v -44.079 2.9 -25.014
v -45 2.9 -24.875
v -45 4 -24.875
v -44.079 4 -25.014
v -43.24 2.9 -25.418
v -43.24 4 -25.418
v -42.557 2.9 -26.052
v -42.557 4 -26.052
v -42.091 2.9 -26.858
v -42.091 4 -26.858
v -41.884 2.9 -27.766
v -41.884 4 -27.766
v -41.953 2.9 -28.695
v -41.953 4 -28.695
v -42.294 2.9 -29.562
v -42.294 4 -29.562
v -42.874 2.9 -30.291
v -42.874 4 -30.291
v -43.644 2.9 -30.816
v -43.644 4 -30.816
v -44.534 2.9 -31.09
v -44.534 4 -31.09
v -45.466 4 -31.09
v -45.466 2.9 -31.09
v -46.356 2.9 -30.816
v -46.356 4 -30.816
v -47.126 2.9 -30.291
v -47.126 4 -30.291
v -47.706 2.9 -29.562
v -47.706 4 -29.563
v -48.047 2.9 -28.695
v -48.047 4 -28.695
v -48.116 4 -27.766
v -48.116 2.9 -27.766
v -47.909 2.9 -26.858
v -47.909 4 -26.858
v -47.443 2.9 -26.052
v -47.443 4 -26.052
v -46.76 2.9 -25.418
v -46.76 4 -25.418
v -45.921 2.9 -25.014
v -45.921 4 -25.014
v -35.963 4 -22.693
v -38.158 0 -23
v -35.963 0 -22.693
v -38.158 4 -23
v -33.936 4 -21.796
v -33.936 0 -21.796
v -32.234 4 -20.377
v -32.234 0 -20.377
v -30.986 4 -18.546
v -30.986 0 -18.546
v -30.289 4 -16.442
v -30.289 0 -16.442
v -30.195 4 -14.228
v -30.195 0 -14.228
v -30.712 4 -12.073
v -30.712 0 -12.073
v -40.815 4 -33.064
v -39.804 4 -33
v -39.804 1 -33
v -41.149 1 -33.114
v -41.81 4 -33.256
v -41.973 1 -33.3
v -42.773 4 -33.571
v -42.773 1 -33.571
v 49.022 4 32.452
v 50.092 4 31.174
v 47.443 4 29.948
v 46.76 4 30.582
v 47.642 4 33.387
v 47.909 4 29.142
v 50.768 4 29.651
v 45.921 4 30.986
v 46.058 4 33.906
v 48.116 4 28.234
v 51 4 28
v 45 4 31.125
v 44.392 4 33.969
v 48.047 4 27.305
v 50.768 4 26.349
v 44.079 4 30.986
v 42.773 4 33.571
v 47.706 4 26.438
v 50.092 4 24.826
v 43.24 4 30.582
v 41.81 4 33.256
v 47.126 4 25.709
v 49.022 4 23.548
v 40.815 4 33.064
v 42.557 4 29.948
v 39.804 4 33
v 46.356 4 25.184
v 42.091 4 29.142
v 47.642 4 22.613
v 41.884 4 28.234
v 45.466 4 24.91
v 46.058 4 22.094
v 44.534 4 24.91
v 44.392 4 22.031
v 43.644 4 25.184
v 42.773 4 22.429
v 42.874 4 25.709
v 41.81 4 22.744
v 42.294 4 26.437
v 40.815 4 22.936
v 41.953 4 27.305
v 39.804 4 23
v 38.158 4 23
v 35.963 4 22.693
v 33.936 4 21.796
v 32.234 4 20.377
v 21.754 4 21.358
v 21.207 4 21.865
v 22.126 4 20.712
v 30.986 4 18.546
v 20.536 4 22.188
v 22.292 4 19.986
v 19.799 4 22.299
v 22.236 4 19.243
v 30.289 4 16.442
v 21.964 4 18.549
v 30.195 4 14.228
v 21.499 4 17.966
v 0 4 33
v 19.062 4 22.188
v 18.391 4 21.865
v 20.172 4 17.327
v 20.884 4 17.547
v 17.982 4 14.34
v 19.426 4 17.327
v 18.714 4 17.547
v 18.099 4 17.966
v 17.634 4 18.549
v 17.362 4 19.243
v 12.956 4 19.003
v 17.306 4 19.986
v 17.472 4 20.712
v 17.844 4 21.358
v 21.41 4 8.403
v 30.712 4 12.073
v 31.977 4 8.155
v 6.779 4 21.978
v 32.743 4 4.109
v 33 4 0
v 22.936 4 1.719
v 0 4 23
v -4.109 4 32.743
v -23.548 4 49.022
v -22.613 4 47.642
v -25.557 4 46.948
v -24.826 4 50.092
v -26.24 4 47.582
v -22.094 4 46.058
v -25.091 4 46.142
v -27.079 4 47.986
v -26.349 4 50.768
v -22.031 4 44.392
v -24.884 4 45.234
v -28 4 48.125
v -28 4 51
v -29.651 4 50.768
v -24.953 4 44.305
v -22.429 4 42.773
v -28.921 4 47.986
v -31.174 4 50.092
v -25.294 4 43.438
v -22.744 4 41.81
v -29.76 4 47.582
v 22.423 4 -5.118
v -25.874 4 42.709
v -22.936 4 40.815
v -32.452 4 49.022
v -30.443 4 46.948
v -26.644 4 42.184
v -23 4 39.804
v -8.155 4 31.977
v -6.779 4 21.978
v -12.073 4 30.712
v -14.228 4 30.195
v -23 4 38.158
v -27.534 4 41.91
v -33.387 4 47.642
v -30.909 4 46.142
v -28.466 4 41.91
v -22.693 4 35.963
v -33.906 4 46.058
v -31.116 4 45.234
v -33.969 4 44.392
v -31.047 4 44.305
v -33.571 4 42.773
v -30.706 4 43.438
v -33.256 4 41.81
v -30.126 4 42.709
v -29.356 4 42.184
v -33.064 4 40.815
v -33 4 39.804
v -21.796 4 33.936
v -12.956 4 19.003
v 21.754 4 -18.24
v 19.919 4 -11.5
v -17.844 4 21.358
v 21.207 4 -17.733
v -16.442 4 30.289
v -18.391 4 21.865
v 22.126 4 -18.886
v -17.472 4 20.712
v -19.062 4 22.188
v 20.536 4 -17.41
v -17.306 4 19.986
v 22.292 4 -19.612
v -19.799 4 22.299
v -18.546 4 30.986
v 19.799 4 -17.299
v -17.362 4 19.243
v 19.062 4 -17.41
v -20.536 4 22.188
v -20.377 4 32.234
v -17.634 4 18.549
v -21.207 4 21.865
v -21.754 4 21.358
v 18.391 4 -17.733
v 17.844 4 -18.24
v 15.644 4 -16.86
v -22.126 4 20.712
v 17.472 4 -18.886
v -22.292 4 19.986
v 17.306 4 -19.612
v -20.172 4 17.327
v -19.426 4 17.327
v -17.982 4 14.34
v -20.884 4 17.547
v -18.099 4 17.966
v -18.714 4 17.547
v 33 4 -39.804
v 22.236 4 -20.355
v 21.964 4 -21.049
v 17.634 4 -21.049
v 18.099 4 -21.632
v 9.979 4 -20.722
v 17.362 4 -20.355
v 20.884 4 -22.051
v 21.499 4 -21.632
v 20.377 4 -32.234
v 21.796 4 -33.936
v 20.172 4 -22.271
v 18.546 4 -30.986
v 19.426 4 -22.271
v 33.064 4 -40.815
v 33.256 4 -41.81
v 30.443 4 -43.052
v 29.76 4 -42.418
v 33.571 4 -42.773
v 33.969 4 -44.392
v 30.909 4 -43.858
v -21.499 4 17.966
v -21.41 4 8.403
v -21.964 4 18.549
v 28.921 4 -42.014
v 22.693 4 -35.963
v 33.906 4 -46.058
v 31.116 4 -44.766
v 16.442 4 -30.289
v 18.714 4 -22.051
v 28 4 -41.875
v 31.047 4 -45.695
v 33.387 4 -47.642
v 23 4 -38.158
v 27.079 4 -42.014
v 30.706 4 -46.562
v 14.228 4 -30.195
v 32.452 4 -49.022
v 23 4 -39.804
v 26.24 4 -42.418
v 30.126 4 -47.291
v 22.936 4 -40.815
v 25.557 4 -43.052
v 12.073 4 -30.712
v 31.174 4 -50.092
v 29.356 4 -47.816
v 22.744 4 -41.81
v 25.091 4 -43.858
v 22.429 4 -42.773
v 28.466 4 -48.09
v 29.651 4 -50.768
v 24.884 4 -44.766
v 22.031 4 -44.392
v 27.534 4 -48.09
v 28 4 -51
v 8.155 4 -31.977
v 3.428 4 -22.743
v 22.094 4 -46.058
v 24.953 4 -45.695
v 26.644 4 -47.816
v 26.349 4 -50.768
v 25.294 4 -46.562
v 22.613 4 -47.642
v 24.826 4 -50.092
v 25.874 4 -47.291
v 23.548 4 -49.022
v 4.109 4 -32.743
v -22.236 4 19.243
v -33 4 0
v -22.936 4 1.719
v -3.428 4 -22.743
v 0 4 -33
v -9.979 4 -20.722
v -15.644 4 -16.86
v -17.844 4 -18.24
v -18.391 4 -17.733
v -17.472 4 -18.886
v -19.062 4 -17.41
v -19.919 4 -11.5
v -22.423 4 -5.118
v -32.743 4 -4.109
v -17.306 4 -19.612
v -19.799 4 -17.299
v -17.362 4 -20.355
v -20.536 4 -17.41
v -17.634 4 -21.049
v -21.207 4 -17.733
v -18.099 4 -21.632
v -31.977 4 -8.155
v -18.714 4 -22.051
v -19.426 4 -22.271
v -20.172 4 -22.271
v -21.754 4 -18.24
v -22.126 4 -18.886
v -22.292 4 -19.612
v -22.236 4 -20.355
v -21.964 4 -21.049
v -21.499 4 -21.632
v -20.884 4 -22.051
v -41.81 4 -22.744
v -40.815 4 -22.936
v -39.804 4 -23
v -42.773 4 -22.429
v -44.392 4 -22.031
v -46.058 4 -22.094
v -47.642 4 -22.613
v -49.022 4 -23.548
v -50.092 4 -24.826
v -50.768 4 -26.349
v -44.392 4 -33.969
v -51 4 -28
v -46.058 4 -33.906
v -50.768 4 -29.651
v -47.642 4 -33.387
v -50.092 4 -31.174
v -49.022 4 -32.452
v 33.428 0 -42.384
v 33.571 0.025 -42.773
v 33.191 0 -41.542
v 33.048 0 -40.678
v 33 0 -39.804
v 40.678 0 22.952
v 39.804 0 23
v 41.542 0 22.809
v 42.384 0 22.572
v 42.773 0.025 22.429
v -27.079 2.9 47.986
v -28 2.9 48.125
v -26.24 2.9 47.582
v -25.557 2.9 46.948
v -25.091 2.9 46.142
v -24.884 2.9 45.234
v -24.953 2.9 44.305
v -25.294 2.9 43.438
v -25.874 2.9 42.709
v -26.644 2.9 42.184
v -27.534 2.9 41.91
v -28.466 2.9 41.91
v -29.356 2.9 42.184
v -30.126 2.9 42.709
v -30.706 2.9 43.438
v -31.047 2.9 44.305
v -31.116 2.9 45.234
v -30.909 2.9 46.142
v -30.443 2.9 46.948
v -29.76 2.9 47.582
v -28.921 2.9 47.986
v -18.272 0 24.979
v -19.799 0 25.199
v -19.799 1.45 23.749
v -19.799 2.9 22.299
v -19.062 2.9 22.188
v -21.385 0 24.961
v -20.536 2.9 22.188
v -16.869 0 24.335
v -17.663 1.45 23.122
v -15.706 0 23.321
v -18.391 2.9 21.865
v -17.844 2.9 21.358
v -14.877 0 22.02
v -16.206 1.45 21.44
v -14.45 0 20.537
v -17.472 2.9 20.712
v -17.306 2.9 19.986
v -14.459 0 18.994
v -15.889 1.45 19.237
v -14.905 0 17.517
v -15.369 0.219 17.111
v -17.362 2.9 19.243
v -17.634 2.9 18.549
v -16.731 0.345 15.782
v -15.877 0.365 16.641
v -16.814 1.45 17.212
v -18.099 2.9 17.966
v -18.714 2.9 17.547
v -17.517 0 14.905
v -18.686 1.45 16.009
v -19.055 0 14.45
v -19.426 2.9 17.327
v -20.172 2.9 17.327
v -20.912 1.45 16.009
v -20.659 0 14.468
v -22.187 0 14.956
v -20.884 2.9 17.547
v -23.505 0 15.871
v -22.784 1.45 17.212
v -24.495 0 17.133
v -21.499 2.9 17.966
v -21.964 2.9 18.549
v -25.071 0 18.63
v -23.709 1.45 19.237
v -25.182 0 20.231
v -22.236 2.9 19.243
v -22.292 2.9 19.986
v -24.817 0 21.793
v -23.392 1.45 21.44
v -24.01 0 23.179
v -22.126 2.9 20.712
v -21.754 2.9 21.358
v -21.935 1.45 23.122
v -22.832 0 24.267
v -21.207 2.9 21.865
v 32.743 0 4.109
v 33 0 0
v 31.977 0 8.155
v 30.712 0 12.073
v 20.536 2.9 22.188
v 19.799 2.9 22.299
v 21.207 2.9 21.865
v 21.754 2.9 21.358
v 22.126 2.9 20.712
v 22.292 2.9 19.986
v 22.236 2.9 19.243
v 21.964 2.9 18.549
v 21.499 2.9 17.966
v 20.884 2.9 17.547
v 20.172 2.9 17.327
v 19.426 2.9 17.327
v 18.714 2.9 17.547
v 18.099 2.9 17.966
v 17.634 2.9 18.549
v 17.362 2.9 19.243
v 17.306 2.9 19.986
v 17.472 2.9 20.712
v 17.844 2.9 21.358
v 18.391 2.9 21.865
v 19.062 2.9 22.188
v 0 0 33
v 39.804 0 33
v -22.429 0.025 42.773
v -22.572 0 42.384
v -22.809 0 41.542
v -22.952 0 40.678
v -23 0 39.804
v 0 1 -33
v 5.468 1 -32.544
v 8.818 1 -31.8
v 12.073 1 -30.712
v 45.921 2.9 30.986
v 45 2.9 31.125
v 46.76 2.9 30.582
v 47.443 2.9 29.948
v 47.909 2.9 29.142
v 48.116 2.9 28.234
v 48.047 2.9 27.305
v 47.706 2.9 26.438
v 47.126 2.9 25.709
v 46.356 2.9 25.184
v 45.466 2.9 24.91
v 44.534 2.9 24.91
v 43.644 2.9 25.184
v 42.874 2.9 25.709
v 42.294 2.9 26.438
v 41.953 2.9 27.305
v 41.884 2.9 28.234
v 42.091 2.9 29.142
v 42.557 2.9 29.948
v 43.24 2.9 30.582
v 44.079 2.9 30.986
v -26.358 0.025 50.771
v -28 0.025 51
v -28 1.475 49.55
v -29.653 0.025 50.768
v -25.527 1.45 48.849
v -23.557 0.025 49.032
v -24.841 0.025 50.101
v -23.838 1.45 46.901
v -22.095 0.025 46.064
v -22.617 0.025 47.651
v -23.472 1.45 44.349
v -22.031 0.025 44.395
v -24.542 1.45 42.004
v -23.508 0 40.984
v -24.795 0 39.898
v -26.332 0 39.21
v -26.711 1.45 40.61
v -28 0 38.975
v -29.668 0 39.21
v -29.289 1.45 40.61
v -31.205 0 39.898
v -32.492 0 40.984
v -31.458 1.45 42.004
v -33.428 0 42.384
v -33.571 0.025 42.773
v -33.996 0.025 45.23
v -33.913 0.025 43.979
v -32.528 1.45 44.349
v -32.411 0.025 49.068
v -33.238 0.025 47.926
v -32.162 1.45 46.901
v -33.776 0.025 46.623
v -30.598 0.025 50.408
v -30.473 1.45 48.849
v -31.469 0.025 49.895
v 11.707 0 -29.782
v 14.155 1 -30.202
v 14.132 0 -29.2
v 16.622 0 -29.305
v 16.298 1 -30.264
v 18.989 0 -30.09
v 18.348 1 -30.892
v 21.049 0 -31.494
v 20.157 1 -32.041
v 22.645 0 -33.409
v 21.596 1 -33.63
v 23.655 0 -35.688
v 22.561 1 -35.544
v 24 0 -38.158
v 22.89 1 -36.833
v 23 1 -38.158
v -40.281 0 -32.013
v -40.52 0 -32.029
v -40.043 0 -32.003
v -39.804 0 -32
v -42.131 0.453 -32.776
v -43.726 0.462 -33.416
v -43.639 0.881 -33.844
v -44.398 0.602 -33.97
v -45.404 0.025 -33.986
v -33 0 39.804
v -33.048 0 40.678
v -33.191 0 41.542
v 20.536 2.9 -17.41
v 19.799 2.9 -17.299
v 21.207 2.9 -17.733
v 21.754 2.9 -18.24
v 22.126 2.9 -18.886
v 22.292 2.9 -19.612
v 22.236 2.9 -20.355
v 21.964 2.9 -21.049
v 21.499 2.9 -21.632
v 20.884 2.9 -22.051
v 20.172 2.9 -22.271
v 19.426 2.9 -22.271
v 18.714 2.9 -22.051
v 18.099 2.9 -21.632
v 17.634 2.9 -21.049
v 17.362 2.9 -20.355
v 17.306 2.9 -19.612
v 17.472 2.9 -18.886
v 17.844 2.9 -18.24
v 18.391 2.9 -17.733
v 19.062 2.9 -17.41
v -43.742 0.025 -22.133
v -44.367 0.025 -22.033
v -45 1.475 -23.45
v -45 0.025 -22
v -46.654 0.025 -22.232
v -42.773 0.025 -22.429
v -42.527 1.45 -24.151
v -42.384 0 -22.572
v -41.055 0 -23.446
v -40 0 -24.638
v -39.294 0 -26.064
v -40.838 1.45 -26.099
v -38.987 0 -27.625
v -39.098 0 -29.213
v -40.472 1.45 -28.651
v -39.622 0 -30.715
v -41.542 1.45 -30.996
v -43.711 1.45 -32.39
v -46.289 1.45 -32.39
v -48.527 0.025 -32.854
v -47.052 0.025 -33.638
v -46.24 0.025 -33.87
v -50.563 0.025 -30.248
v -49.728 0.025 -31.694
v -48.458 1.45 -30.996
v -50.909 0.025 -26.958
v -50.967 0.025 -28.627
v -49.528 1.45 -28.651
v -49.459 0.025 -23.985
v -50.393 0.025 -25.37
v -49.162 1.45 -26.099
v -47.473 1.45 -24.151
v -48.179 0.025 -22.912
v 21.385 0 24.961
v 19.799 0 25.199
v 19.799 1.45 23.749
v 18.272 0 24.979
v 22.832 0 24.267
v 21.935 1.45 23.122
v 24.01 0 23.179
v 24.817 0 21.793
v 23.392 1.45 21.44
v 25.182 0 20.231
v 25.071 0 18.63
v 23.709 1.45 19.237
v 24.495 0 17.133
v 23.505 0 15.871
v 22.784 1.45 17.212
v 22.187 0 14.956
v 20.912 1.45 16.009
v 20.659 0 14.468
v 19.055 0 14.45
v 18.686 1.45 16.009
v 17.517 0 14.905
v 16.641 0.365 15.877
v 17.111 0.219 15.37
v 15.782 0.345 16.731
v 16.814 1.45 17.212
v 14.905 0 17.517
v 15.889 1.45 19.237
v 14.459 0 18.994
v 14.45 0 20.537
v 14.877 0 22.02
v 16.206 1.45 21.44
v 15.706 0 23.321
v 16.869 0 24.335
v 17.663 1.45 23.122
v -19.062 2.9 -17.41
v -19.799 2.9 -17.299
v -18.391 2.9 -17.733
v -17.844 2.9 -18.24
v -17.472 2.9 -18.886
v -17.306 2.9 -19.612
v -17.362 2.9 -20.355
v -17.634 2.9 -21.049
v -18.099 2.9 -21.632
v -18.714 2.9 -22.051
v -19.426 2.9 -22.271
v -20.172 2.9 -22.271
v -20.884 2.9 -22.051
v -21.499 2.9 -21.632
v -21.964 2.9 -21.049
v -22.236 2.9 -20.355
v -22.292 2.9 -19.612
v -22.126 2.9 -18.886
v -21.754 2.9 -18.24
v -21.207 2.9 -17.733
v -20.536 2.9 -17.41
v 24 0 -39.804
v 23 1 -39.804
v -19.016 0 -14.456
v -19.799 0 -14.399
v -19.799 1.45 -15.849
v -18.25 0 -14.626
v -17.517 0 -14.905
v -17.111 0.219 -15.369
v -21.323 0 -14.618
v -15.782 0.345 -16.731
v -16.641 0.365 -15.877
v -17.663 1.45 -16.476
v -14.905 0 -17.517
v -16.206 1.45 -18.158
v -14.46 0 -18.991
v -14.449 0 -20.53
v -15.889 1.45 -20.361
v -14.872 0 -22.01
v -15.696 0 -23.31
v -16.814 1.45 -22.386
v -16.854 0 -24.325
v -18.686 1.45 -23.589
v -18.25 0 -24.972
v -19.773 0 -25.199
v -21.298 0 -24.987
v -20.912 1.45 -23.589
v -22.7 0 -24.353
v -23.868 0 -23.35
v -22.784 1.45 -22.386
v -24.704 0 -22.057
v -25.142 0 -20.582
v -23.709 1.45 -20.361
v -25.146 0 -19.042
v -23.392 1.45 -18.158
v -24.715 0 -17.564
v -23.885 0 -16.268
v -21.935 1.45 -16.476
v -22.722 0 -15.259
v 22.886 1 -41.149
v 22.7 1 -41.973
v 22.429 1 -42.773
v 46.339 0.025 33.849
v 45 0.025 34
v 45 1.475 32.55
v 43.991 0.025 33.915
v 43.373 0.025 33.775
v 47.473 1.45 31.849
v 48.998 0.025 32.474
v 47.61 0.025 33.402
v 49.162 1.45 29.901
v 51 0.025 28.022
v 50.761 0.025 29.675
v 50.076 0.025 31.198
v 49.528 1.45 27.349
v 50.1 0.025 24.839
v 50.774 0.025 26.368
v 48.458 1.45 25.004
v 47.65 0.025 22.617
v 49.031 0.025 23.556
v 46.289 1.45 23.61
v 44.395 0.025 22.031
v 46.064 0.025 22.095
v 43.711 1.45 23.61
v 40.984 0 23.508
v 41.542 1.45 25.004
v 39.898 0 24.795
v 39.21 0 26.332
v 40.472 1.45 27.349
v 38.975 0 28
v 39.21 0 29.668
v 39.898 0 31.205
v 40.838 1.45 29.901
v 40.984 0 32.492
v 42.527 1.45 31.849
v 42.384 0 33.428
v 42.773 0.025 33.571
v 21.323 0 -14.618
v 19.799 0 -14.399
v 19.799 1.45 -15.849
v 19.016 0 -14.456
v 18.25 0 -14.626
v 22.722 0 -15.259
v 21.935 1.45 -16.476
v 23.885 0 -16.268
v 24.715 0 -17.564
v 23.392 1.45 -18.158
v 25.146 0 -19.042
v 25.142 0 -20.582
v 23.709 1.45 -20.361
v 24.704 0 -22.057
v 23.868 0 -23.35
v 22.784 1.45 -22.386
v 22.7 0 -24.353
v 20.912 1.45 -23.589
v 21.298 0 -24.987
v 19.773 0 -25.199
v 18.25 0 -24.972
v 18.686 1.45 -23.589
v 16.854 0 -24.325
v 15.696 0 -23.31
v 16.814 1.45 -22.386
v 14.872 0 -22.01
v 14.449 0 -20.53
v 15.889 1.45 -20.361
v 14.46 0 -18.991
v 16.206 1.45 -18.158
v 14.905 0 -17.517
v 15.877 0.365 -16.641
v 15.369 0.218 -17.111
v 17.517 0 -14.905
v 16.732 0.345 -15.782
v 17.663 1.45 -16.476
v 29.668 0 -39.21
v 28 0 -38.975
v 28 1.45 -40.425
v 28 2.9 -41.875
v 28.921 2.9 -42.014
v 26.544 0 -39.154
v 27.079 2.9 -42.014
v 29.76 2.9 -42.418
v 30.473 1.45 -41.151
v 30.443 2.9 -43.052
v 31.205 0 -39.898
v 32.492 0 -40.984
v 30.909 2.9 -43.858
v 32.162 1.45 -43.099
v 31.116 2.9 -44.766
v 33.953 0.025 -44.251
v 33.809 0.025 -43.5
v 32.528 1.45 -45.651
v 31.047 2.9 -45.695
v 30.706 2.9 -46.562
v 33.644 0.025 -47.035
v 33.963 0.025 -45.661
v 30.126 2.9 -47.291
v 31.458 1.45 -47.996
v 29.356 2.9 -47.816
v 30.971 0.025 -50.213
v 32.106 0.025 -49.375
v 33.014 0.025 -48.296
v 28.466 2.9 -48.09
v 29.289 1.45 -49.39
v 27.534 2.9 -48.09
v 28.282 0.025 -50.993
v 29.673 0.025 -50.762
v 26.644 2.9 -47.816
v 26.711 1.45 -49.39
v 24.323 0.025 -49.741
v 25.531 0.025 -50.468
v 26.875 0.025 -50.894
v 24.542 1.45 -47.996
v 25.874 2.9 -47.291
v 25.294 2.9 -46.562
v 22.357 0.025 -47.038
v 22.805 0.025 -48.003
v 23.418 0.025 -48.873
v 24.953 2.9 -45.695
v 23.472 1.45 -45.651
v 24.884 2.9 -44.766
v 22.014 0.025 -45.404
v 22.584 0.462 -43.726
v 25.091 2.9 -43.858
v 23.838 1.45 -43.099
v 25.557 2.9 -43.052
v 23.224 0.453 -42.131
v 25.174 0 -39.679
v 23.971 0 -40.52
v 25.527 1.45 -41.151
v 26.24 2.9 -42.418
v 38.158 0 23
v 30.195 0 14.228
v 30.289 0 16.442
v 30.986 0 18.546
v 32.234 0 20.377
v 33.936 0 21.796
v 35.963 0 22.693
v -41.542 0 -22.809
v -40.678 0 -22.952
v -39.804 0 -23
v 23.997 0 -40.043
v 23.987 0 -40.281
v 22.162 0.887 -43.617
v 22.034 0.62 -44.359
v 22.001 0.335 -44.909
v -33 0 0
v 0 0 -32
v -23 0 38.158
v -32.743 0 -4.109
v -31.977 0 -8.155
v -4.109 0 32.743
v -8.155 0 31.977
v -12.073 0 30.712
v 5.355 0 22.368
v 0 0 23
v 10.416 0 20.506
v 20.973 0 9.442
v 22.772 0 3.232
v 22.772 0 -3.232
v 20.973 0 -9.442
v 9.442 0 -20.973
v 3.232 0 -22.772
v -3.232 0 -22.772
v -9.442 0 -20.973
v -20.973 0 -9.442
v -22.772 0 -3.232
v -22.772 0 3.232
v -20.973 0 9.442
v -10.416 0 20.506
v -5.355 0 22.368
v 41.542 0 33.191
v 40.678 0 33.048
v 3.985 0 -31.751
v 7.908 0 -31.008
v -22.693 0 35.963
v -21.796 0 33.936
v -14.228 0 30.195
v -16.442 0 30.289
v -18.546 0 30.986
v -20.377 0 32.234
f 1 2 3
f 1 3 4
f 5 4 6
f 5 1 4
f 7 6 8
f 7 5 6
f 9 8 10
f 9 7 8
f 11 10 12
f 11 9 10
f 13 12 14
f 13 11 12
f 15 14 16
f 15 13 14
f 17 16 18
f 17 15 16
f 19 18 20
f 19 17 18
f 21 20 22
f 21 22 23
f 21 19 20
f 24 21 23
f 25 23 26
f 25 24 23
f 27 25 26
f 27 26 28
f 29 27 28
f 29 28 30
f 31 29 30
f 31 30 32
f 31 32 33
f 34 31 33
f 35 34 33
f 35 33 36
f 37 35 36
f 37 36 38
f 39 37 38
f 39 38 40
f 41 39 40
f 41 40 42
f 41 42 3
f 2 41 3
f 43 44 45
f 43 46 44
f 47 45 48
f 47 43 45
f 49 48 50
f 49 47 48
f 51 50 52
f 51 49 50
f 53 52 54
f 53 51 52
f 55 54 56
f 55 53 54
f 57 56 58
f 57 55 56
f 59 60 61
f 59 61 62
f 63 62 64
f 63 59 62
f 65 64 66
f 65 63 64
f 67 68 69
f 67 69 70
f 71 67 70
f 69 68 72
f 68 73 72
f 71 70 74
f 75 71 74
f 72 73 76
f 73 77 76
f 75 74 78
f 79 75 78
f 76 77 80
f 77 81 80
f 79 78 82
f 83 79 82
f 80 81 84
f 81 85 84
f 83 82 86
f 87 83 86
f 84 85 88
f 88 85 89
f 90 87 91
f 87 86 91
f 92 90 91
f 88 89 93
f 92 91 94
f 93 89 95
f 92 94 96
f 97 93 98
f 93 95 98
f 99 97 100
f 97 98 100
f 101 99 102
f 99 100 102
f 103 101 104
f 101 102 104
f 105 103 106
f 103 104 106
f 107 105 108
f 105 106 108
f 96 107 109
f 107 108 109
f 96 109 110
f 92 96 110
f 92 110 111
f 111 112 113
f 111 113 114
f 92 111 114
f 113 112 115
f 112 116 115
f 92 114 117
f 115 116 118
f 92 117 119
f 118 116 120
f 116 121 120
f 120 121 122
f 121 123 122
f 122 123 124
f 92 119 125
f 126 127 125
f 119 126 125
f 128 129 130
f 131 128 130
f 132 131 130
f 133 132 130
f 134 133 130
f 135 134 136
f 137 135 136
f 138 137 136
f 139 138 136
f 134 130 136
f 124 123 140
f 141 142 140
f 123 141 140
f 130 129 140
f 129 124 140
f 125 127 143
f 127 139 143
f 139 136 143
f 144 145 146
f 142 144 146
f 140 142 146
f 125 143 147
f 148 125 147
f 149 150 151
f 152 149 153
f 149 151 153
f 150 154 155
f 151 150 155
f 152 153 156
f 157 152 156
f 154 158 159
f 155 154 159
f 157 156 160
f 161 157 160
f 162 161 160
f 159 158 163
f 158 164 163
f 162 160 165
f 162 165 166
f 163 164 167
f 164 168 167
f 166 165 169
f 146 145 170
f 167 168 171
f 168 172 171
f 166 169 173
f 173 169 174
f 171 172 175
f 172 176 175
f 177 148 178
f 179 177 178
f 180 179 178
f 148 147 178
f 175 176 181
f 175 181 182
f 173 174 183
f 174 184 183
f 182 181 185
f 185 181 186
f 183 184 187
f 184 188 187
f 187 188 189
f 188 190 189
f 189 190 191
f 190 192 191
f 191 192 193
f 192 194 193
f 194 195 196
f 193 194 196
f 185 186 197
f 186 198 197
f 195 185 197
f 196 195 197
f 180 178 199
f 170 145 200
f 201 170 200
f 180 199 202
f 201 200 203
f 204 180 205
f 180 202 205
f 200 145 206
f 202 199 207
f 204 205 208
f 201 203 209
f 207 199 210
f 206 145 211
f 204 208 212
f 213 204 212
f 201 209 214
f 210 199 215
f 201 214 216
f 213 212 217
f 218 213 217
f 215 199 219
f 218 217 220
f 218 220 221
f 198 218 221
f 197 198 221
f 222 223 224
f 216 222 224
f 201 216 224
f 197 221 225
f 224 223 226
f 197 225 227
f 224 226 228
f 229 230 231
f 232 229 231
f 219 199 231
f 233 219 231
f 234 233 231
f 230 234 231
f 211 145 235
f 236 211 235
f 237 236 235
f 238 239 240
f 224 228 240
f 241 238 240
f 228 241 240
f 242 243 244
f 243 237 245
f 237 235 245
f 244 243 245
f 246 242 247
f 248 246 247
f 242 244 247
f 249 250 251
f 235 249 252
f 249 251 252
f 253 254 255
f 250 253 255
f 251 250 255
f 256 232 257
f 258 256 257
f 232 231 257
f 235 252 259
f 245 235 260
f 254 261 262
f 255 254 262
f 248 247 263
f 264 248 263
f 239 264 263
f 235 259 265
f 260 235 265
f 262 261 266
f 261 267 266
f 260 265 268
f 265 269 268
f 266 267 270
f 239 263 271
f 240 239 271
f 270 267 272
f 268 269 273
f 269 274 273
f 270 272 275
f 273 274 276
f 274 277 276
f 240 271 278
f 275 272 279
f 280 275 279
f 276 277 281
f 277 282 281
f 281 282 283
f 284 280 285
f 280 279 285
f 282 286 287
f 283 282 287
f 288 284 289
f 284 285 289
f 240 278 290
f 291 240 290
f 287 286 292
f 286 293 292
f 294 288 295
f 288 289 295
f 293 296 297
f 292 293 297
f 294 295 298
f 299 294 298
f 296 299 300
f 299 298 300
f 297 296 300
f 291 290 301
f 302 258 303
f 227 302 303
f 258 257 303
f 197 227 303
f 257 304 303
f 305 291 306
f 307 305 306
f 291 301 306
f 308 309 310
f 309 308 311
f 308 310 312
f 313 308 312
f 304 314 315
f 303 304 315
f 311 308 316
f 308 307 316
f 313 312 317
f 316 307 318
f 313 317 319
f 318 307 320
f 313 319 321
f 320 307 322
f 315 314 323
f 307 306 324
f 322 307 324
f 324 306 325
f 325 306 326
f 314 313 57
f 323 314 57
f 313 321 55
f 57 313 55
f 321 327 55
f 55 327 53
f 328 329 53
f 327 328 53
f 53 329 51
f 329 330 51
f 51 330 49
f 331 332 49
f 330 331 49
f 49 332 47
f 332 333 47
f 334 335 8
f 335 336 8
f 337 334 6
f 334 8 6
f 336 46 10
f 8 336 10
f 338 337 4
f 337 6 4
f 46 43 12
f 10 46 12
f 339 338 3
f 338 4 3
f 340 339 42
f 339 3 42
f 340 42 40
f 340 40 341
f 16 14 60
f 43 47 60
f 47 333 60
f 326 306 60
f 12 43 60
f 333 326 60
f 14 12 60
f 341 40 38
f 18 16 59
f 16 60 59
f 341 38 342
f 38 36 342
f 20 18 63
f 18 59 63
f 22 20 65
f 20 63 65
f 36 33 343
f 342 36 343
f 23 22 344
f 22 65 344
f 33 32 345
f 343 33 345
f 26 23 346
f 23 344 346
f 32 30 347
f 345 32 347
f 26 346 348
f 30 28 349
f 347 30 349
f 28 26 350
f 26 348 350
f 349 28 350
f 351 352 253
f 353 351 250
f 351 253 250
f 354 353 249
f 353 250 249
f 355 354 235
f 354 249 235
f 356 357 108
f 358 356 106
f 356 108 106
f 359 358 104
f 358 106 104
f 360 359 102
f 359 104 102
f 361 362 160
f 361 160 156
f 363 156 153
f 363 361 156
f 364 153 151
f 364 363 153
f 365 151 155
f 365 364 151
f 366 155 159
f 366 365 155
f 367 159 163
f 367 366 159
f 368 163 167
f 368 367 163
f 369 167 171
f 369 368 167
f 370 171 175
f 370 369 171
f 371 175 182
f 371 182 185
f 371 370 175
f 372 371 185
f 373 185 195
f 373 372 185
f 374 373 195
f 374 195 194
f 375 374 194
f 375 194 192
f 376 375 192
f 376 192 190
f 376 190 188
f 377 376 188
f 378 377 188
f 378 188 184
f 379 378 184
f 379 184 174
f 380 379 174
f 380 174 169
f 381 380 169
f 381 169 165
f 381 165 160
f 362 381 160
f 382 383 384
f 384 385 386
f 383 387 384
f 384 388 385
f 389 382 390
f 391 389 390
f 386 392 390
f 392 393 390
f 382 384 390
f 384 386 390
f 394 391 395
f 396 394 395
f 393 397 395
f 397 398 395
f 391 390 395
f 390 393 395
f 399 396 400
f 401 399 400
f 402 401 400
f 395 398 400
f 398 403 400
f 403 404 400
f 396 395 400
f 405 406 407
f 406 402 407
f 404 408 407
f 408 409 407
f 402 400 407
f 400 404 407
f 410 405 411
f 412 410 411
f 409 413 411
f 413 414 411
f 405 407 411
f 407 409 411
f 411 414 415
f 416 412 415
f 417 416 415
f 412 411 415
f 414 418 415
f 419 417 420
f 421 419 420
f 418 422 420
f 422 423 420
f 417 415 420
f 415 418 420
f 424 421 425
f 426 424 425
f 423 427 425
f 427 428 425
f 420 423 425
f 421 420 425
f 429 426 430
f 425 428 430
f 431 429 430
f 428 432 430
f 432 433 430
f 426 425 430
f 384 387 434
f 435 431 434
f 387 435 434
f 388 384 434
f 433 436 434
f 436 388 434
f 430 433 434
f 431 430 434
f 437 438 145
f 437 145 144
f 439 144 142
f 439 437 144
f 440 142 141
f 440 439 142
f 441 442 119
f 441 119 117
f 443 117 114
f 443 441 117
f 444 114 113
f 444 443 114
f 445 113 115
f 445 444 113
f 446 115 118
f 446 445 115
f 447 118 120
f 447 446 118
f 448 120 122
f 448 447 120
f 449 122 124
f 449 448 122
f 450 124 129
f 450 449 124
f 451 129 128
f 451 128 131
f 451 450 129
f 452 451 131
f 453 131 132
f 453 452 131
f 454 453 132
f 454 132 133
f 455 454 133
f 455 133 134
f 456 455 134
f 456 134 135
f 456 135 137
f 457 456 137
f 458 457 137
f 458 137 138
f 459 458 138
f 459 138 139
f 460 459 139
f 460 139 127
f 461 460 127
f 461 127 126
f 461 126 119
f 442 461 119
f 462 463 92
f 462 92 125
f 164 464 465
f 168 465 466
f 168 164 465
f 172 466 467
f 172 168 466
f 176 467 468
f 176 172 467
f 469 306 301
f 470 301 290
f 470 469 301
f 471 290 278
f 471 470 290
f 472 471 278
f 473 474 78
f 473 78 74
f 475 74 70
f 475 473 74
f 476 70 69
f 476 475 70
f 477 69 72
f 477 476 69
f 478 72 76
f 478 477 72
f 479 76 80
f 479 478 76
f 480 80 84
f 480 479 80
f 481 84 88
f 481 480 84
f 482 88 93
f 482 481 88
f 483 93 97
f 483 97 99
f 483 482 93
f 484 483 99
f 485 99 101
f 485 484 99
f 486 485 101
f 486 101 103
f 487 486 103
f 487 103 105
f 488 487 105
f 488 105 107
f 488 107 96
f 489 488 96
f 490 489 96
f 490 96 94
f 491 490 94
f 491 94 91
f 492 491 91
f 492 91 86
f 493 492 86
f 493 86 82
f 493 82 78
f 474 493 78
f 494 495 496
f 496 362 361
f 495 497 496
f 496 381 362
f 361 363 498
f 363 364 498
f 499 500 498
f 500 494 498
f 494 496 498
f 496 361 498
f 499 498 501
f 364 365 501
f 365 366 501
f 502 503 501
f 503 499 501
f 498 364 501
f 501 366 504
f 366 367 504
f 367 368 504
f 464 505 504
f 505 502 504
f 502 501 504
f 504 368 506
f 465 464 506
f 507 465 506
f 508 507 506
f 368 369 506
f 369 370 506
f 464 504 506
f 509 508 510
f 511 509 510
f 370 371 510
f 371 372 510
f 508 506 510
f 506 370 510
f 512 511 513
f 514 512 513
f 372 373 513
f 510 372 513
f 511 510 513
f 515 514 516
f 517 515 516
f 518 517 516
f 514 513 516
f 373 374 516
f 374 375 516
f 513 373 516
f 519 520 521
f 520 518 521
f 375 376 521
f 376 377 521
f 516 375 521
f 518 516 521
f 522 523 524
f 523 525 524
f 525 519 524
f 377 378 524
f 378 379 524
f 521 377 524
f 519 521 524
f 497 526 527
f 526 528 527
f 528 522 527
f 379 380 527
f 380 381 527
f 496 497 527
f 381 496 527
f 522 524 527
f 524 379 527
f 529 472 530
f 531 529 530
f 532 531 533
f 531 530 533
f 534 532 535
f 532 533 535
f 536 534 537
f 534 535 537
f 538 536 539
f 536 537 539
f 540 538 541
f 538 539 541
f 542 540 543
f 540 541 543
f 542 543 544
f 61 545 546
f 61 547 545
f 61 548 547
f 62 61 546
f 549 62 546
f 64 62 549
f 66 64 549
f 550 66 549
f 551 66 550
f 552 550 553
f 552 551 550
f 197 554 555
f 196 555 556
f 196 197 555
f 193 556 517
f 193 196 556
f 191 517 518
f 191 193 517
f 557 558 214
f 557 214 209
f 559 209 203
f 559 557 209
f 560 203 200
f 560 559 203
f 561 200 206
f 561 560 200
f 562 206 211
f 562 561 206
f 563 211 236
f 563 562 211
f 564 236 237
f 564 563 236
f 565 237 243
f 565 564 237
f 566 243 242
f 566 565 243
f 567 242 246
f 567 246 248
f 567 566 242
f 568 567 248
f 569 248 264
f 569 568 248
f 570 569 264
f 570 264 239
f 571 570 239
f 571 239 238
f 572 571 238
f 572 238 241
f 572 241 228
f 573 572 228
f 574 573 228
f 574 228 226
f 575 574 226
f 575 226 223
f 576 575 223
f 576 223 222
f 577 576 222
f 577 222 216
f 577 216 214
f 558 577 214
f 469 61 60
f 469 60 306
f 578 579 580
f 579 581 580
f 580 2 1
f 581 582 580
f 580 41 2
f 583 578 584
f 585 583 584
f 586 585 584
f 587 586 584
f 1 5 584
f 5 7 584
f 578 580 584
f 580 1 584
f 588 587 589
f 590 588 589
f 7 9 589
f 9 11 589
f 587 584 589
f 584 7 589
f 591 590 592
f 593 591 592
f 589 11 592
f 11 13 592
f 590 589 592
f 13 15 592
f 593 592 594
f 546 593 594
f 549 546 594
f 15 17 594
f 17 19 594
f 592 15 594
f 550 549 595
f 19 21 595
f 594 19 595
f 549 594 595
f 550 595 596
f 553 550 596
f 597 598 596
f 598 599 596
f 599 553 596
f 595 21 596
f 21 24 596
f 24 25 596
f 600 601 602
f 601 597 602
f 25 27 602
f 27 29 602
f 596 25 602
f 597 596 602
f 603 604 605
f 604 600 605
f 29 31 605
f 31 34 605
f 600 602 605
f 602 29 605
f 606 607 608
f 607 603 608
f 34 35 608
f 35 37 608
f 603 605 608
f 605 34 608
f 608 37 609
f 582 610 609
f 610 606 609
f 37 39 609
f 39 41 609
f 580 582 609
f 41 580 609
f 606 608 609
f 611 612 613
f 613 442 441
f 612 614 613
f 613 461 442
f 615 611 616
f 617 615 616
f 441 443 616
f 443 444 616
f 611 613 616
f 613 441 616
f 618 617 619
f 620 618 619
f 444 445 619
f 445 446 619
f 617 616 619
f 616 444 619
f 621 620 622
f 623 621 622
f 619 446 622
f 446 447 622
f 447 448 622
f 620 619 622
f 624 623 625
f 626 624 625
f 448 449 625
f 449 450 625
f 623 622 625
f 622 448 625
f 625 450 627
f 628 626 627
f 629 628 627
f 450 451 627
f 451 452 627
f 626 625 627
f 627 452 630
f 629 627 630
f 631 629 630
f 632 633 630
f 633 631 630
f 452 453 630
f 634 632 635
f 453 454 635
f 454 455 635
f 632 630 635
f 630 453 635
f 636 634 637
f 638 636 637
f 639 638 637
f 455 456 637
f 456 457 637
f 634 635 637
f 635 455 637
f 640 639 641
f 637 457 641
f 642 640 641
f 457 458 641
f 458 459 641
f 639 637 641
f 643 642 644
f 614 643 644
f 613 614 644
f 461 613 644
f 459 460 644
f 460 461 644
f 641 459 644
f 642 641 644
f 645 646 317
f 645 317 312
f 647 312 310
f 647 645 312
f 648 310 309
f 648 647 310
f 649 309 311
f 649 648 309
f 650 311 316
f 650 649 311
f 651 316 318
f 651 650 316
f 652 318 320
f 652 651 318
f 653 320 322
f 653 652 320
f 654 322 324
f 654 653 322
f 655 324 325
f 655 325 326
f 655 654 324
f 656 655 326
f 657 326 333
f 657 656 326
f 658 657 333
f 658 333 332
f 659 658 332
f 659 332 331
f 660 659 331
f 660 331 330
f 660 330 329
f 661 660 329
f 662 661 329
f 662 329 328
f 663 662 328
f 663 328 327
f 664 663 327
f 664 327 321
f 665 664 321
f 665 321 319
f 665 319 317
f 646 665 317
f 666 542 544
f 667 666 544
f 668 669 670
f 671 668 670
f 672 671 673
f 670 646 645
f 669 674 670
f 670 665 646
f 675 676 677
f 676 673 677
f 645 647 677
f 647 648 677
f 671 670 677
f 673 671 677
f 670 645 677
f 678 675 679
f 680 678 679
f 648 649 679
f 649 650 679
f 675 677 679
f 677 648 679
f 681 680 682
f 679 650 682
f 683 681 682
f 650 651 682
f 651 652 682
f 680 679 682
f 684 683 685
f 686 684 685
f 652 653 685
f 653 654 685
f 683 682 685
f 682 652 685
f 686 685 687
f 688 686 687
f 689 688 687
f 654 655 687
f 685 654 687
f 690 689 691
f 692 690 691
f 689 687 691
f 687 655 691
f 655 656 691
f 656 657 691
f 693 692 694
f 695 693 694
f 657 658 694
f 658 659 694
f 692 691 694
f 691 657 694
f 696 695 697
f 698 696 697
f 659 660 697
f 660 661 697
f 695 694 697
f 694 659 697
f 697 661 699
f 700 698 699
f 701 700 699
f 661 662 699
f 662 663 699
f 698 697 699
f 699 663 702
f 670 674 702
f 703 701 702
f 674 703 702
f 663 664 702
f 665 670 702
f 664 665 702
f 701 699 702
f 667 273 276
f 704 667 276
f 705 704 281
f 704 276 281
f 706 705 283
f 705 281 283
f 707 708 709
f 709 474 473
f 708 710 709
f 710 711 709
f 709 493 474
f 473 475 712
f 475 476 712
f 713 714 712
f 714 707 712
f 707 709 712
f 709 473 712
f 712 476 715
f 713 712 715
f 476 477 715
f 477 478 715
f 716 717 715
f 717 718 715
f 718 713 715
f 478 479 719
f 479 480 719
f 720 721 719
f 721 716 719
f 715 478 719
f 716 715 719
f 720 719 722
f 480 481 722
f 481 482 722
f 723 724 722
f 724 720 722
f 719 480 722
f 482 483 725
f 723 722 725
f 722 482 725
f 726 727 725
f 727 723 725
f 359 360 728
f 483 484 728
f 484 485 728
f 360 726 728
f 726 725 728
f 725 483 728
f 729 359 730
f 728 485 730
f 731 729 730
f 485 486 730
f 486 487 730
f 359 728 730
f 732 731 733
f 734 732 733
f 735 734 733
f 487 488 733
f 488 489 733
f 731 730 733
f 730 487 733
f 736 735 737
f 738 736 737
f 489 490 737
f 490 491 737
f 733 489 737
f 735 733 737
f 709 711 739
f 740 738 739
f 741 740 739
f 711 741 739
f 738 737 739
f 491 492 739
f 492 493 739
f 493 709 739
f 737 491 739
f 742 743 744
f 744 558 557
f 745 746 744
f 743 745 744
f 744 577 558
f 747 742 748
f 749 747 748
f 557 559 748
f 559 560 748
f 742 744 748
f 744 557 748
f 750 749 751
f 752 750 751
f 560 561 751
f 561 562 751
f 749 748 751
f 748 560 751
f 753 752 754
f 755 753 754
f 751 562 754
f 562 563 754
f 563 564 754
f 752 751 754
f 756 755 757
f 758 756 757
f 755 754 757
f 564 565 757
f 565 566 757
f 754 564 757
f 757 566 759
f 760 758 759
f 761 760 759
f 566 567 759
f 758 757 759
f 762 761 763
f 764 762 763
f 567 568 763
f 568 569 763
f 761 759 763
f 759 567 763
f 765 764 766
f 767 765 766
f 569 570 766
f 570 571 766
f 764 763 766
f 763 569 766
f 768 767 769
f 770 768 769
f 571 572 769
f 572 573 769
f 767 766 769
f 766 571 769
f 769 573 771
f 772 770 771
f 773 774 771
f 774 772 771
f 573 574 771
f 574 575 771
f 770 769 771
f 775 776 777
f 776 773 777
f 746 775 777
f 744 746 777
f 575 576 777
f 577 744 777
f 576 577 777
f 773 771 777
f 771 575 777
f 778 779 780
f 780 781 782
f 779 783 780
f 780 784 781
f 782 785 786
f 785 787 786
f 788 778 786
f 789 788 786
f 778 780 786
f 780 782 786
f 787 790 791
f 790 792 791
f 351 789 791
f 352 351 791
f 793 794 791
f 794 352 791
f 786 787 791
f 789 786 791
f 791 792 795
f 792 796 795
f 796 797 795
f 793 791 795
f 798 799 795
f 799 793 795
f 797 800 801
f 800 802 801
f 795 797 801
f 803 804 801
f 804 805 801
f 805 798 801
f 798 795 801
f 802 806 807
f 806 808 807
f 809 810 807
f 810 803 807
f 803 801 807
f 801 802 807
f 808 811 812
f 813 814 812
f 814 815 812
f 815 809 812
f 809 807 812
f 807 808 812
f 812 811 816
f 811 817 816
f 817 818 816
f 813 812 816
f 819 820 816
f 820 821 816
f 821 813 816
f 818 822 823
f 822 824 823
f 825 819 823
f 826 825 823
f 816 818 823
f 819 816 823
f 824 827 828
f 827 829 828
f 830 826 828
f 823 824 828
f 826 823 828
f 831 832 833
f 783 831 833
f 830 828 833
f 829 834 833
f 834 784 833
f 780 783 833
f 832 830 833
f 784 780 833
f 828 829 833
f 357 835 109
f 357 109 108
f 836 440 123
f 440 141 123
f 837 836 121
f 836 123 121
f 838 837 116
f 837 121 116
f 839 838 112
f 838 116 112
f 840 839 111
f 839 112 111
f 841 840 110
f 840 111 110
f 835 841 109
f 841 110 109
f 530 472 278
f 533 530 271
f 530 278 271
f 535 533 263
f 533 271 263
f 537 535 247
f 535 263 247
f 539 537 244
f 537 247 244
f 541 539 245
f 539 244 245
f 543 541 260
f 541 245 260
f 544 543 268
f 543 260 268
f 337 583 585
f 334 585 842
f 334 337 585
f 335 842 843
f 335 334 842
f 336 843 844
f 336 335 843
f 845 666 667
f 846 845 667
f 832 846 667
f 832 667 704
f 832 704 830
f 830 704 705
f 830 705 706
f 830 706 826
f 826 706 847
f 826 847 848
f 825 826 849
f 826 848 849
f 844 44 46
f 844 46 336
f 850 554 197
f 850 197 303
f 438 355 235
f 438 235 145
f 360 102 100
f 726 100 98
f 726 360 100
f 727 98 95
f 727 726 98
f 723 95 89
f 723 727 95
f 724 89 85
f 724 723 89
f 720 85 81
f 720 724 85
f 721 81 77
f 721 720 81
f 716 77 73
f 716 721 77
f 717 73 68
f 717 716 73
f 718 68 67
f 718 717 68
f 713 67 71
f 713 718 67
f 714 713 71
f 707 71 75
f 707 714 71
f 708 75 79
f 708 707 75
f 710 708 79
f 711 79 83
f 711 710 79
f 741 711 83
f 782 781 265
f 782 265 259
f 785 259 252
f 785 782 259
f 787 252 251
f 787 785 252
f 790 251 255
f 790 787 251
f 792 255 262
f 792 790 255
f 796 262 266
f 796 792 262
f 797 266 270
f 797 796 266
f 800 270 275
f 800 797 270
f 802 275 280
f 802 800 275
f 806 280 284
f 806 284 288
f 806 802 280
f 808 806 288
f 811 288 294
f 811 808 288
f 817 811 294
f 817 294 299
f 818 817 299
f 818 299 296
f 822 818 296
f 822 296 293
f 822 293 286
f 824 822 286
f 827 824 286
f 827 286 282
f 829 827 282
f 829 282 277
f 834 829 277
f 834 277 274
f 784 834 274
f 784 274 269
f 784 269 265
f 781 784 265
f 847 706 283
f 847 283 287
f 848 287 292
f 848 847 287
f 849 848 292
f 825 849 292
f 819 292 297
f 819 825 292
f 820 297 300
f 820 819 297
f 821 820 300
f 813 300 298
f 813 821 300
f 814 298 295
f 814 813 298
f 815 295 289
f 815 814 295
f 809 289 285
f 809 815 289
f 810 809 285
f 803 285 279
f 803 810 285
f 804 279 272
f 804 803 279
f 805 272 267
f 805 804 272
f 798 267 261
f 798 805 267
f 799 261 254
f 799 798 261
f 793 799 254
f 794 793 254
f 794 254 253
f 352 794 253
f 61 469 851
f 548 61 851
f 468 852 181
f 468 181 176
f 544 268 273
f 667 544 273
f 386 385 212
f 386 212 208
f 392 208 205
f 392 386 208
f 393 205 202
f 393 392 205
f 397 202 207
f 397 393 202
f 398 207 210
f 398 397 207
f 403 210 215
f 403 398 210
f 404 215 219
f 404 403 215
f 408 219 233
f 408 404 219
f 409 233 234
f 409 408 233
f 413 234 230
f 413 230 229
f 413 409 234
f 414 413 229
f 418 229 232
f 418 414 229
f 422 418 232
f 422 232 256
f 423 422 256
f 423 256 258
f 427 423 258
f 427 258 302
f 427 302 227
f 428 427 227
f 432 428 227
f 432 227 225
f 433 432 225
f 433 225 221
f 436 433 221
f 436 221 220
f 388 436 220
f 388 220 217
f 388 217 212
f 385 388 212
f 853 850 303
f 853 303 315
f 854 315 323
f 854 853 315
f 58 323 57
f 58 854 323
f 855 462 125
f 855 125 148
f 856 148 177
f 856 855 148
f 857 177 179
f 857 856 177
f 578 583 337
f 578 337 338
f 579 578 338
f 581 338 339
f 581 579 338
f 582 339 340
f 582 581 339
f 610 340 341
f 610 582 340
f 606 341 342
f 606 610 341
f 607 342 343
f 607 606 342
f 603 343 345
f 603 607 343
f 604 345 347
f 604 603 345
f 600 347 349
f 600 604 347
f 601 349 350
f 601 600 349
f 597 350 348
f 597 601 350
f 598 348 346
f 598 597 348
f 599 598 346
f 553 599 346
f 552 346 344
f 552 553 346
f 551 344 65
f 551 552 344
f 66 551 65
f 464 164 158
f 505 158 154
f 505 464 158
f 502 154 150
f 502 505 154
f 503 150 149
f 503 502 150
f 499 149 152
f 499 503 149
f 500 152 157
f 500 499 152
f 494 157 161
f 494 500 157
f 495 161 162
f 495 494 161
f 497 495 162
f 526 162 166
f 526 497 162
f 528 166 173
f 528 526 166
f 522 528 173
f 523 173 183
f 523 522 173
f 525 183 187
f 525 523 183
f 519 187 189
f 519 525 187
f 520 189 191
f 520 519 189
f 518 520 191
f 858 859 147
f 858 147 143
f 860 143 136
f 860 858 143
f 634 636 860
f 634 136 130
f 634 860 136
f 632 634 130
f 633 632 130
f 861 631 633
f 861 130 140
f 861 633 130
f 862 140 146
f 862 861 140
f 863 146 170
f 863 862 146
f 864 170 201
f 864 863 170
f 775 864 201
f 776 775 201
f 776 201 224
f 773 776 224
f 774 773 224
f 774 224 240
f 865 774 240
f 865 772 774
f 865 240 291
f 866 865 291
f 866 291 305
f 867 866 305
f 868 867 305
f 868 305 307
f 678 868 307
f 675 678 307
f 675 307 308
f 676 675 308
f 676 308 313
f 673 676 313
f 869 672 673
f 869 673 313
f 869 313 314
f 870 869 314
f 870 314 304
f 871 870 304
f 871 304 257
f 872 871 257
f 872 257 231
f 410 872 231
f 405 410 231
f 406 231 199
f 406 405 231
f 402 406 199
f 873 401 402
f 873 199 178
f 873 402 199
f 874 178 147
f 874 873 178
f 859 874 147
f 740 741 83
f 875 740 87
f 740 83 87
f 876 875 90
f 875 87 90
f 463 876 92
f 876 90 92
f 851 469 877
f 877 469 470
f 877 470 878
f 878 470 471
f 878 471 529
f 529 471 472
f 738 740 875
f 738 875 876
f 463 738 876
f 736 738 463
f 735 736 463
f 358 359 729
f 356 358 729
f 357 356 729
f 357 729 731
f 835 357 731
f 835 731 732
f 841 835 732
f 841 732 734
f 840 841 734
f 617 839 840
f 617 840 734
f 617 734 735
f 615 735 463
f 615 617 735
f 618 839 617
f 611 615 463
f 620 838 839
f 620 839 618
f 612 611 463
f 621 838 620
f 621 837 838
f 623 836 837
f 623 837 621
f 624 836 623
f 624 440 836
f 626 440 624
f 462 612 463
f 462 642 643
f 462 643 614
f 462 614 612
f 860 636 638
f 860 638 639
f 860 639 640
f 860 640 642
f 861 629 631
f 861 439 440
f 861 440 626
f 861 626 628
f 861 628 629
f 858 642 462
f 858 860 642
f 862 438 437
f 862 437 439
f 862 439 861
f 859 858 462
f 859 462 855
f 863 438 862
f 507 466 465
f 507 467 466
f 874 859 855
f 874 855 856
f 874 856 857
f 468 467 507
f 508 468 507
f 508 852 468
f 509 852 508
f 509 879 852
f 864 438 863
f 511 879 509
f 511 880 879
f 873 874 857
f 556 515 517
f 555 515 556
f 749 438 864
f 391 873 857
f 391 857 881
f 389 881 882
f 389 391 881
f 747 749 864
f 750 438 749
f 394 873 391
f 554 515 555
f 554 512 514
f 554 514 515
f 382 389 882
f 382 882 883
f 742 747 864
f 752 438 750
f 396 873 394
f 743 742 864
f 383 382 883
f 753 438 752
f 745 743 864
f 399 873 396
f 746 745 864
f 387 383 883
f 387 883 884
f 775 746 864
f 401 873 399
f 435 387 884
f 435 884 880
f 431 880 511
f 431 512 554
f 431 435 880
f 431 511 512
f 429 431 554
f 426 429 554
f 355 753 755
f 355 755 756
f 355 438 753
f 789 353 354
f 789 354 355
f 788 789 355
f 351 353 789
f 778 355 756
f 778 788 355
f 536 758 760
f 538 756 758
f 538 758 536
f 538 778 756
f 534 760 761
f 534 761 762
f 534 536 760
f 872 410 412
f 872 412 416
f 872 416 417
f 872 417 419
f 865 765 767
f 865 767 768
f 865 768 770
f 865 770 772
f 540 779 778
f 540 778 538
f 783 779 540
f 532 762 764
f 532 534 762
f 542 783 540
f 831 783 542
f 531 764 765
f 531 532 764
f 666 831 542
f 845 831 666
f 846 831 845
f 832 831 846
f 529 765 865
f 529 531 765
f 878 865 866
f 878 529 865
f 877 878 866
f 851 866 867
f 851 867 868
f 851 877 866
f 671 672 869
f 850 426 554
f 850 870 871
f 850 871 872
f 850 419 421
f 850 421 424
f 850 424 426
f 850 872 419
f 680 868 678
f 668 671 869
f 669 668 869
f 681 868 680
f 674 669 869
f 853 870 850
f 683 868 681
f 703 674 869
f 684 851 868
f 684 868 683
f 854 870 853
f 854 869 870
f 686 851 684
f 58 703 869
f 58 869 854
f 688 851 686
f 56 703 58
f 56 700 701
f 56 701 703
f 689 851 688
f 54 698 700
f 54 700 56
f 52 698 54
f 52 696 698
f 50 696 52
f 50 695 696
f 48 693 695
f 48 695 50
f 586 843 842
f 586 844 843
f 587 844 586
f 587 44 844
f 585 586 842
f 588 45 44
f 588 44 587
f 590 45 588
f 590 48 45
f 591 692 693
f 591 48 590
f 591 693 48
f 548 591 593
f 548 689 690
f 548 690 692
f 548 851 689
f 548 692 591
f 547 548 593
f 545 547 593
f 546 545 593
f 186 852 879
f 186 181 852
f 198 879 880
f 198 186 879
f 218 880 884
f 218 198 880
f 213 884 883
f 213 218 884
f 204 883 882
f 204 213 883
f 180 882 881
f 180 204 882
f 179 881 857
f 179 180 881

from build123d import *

# Parameters (mm, degrees)
SKETCH1_R           = 23
SKETCH1_R_2         = 2.5
SKETCH1_R_3         = 3.125
BOSS_EXTRUDE1_DEPTH = 4
FILLET1_R           = 8
CHAMFER1_SIZE       = 2.9


with BuildPart() as part:
    # Sketch1 → Boss-Extrude1 (new body)
    with BuildSketch(Plane(origin=(0, 0, 0), x_dir=(1, 0, 0), z_dir=(0, 1, 0))):
        with BuildLine():
            Line((-41.68337521, 33), (0, 33))
            ThreePointArc((0, 33), (12.411234198, 30.577136322), (23, 23.664319132))
            Line((23, 23.664319132), (23, 41.68337521))
            ThreePointArc((23, 41.68337521), (28, 51), (33, 41.68337521))
            Line((33, 41.68337521), (33, 0))
            ThreePointArc((33, 0), (30.577136322, -12.411234198), (23.664319132, -23))
            Line((23.664319132, -23), (41.68337521, -23))
            ThreePointArc((41.68337521, -23), (51, -28), (41.68337521, -33))
            Line((41.68337521, -33), (0, -33))
            ThreePointArc((0, -33), (-12.411234198, -30.577136322), (-23, -23.664319132))
            Line((-23, -23.664319132), (-23, -41.68337521))
            ThreePointArc((-23, -41.68337521), (-28, -51), (-33, -41.68337521))
            Line((-33, -41.68337521), (-33, 0))
            ThreePointArc((-33, 0), (-30.577136322, 12.411234198), (-23.664319132, 23))
            Line((-23.664319132, 23), (-41.68337521, 23))
            ThreePointArc((-41.68337521, 23), (-51, 28), (-41.68337521, 33))
        make_face()
        with Locations(Location((0, 0, 0), (0, 0, 270))):
            Circle(SKETCH1_R, mode=Mode.SUBTRACT)
        with Locations(Location((-19.798989873, 19.798989873, 0), (0, 0, 270))):
            Circle(SKETCH1_R_2, mode=Mode.SUBTRACT)
        with Locations(Location((19.798989873, 19.798989873, 0), (0, 0, 270))):
            Circle(SKETCH1_R_2, mode=Mode.SUBTRACT)
        with Locations(Location((19.798989873, -19.798989873, 0), (0, 0, 270))):
            Circle(SKETCH1_R_2, mode=Mode.SUBTRACT)
        with Locations(Location((-19.798989873, -19.798989873, 0), (0, 0, 270))):
            Circle(SKETCH1_R_2, mode=Mode.SUBTRACT)
        with Locations(Location((-45, 28, 0), (0, 0, 270))):
            Circle(SKETCH1_R_3, mode=Mode.SUBTRACT)
        with Locations(Location((28, 45, 0), (0, 0, 270))):
            Circle(SKETCH1_R_3, mode=Mode.SUBTRACT)
        with Locations(Location((45, -28, 0), (0, 0, 270))):
            Circle(SKETCH1_R_3, mode=Mode.SUBTRACT)
        with Locations(Location((-28, -45, 0), (0, 0, 270))):
            Circle(SKETCH1_R_3, mode=Mode.SUBTRACT)
    extrude(amount=BOSS_EXTRUDE1_DEPTH)

    # Fillet1
    fillet1_edges = [part.edges().sort_by_distance(p)[0] for p in [
        (-41.68337521, 2, -33),
        (23, 2, -23.664319132),
        (23, 2, -41.68337521),
        (33, 2, -41.68337521),
        (23.664319132, 2, 23),
        (41.68337521, 2, 23),
        (41.68337521, 2, 33),
        (-23, 2, 23.664319132),
        (-23, 2, 41.68337521),
        (-33, 2, 41.68337521),
        (-23.664319132, 2, -23),
        (-41.68337521, 2, -23),
    ]]
    fillet(fillet1_edges, radius=FILLET1_R)

    # Chamfer1
    # the kernel refuses this chamfer: 2.9 mm, written as the material it takes off along each edge
    with BuildSketch(Plane(origin=(-45, 0, -28), x_dir=(0, 0, 1), z_dir=(-1, 0, 0))) as chamfer1_piece_1:
        Polygon((3.125 + CHAMFER1_SIZE, 0), (3.125, CHAMFER1_SIZE), (3.125, 0), align=None)
    revolve(axis=Axis((-45, 0, -28), (0, 1, 0)), mode=Mode.SUBTRACT)
    with BuildSketch(Plane(origin=(-28, 0, 45), x_dir=(0, 0, 1), z_dir=(-1, 0, 0))) as chamfer1_piece_2:
        Polygon((3.125 + CHAMFER1_SIZE, 0), (3.125, CHAMFER1_SIZE), (3.125, 0), align=None)
    revolve(axis=Axis((-28, 0, 45), (0, 1, 0)), mode=Mode.SUBTRACT)
    with BuildSketch(Plane(origin=(45, 0, 28), x_dir=(0, 0, 1), z_dir=(-1, 0, 0))) as chamfer1_piece_3:
        Polygon((3.125 + CHAMFER1_SIZE, 0), (3.125, CHAMFER1_SIZE), (3.125, 0), align=None)
    revolve(axis=Axis((45, 0, 28), (0, 1, 0)), mode=Mode.SUBTRACT)
    with BuildSketch(Plane(origin=(28, 0, -45), x_dir=(0, 0, 1), z_dir=(-1, 0, 0))) as chamfer1_piece_4:
        Polygon((3.125 + CHAMFER1_SIZE, 0), (3.125, CHAMFER1_SIZE), (3.125, 0), align=None)
    revolve(axis=Axis((28, 0, -45), (0, 1, 0)), mode=Mode.SUBTRACT)
    with BuildSketch(Plane(origin=(19.798989873, 0, -19.798989873), x_dir=(0, 0, 1), z_dir=(-1, 0, 0))) as chamfer1_piece_5:
        Polygon((2.5 + CHAMFER1_SIZE, 0), (2.5, CHAMFER1_SIZE), (2.5, 0), align=None)
    revolve(axis=Axis((19.798989873, 0, -19.798989873), (0, 1, 0)), mode=Mode.SUBTRACT)
    with BuildSketch(Plane(origin=(19.798989873, 0, 19.798989873), x_dir=(0, 0, 1), z_dir=(-1, 0, 0))) as chamfer1_piece_6:
        Polygon((2.5 + CHAMFER1_SIZE, 0), (2.5, CHAMFER1_SIZE), (2.5, 0), align=None)
    revolve(axis=Axis((19.798989873, 0, 19.798989873), (0, 1, 0)), mode=Mode.SUBTRACT)
    with BuildSketch(Plane(origin=(-19.798989873, 0, 19.798989873), x_dir=(0, 0, 1), z_dir=(-1, 0, 0))) as chamfer1_piece_7:
        Polygon((2.5 + CHAMFER1_SIZE, 0), (2.5, CHAMFER1_SIZE), (2.5, 0), align=None)
    revolve(axis=Axis((-19.798989873, 0, 19.798989873), (0, 1, 0)), mode=Mode.SUBTRACT)
    with BuildSketch(Plane(origin=(-19.798989873, 0, -19.798989873), x_dir=(0, 0, 1), z_dir=(-1, 0, 0))) as chamfer1_piece_8:
        Polygon((2.5 + CHAMFER1_SIZE, 0), (2.5, CHAMFER1_SIZE), (2.5, 0), align=None)
    revolve(axis=Axis((-19.798989873, 0, -19.798989873), (0, 1, 0)), mode=Mode.SUBTRACT)

    # Chamfer2
    # the kernel refuses this chamfer: 1 mm, written as the material it takes off along each edge
    with BuildSketch(Plane(origin=(15, 0, -39.803847577), x_dir=(1, 0, 0), z_dir=(0, 0, 1))) as chamfer2_piece_1:
        with BuildLine():
            Line((9.028284271, -0.028284271), (7.971715729, 1.028284271))
            Line((7.971715729, 1.028284271), (7.951715729, 1.028284271))
            ThreePointArc((7.951715729, 1.028284271), (7.98, 0.514142136), (7.98, 0))
            Line((7.98, 0), (8, -0.02))
            ThreePointArc((8, -0.02), (8.514142136, -0.02), (9.028284271, -0.048284271))
            Line((9.028284271, -0.048284271), (9.028284271, -0.028284271))
        make_face()
    revolve(axis=Axis((15, 0, -39.803847577), (0, 1, 0)), revolution_arc=63.022782151, mode=Mode.SUBTRACT)
    with BuildSketch(Plane(origin=(23, 0, -38.157568057), x_dir=(0.9996219169112968, -0.02749587661058639, 0), z_dir=(0, 0, -1))) as chamfer2_piece_2:
        with BuildLine():
            Line((1.028673195, 0), (-0.056547155, -1.027117794))
            Line((-0.056547155, -1.027117794), (-0.076539593, -1.026567876))
            ThreePointArc((-0.076539593, -1.026567876), (-0.034129227, -0.51339783), (-0.019992438, 0.000549918))
            Line((-0.019992438, 0.000549918), (0.000549918, 0.019992438))
            ThreePointArc((0.000549918, 0.019992438), (0.514497665, 0.00585565), (1.029223113, 0.019992438))
            Line((1.029223113, 0.019992438), (1.028673195, 0))
        make_face()
    extrude(amount=1.646279521, mode=Mode.SUBTRACT)
    with BuildSketch(Plane(origin=(15, 0, -38.157568057), x_dir=(-0.3658536585365853, 0, 0.9306723916262885), z_dir=(-0.9306723916262885, 0, -0.3658536585365853))) as chamfer2_piece_3:
        with BuildLine():
            Line((9.028284271, -0.028284271), (7.971715729, 1.028284271))
            Line((7.971715729, 1.028284271), (7.951715729, 1.028284271))
            ThreePointArc((7.951715729, 1.028284271), (7.98, 0.514142136), (7.98, 0))
            Line((7.98, 0), (8, -0.02))
            ThreePointArc((8, -0.02), (8.514142136, -0.02), (9.028284271, -0.048284271))
            Line((9.028284271, -0.048284271), (9.028284271, -0.028284271))
        make_face()
    revolve(axis=Axis((15, 0, -38.157568057), (0, 1, 0)), revolution_arc=111.460127749, mode=Mode.SUBTRACT)
    with BuildSketch(Plane(origin=(0, 0, 0), x_dir=(0, 0, -1), z_dir=(-1, 0, 0))) as chamfer2_piece_4:
        with BuildLine():
            Line((31.971715729, 0.028284271), (33.028284271, -1.028284271))
            Line((33.028284271, -1.028284271), (33.048284271, -1.028284271))
            ThreePointArc((33.048284271, -1.028284271), (33.02, -0.514142136), (33.02, 0))
            Line((33.02, 0), (33, 0.02))
            ThreePointArc((33, 0.02), (32.485857864, 0.02), (31.971715729, 0.048284271))
            Line((31.971715729, 0.048284271), (31.971715729, 0.028284271))
        make_face()
    revolve(axis=Axis((0, 0, 0), (0, -1, 0)), revolution_arc=21.460127749, mode=Mode.SUBTRACT)
    with BuildSketch(Plane(origin=(-39.803847577, 0, -41), x_dir=(0, 0, 1), z_dir=(1, 0, 0))) as chamfer2_piece_5:
        with BuildLine():
            Line((9.028284271, 0.028284271), (7.971715729, -1.028284271))
            Line((7.971715729, -1.028284271), (7.951715729, -1.028284271))
            ThreePointArc((7.951715729, -1.028284271), (7.98, -0.514142136), (7.98, 0))
            Line((7.98, 0), (8, 0.02))
            ThreePointArc((8, 0.02), (8.514142136, 0.02), (9.028284271, 0.048284271))
            Line((9.028284271, 0.048284271), (9.028284271, 0.028284271))
        make_face()
    revolve(axis=Axis((-39.803847577, 0, -41), (0, -1, 0)), revolution_arc=63.022782151, mode=Mode.SUBTRACT)
    with BuildSketch(Plane(origin=(-39.803847577, 0, -33), x_dir=(0, 0.9996219169112968, -0.02749587661058908), z_dir=(1, 0, 0))) as chamfer2_piece_6:
        with BuildLine():
            Line((1.028673195, 0), (-0.056547155, 1.027117794))
            Line((-0.056547155, 1.027117794), (-0.076539593, 1.026567876))
            ThreePointArc((-0.076539593, 1.026567876), (-0.034129227, 0.51339783), (-0.019992438, -0.000549918))
            Line((-0.019992438, -0.000549918), (0.000549918, -0.019992438))
            ThreePointArc((0.000549918, -0.019992438), (0.514497665, -0.00585565), (1.029223113, -0.019992438))
            Line((1.029223113, -0.019992438), (1.028673195, 0))
        make_face()
    extrude(amount=39.803847577, mode=Mode.SUBTRACT)


solid = part.part
